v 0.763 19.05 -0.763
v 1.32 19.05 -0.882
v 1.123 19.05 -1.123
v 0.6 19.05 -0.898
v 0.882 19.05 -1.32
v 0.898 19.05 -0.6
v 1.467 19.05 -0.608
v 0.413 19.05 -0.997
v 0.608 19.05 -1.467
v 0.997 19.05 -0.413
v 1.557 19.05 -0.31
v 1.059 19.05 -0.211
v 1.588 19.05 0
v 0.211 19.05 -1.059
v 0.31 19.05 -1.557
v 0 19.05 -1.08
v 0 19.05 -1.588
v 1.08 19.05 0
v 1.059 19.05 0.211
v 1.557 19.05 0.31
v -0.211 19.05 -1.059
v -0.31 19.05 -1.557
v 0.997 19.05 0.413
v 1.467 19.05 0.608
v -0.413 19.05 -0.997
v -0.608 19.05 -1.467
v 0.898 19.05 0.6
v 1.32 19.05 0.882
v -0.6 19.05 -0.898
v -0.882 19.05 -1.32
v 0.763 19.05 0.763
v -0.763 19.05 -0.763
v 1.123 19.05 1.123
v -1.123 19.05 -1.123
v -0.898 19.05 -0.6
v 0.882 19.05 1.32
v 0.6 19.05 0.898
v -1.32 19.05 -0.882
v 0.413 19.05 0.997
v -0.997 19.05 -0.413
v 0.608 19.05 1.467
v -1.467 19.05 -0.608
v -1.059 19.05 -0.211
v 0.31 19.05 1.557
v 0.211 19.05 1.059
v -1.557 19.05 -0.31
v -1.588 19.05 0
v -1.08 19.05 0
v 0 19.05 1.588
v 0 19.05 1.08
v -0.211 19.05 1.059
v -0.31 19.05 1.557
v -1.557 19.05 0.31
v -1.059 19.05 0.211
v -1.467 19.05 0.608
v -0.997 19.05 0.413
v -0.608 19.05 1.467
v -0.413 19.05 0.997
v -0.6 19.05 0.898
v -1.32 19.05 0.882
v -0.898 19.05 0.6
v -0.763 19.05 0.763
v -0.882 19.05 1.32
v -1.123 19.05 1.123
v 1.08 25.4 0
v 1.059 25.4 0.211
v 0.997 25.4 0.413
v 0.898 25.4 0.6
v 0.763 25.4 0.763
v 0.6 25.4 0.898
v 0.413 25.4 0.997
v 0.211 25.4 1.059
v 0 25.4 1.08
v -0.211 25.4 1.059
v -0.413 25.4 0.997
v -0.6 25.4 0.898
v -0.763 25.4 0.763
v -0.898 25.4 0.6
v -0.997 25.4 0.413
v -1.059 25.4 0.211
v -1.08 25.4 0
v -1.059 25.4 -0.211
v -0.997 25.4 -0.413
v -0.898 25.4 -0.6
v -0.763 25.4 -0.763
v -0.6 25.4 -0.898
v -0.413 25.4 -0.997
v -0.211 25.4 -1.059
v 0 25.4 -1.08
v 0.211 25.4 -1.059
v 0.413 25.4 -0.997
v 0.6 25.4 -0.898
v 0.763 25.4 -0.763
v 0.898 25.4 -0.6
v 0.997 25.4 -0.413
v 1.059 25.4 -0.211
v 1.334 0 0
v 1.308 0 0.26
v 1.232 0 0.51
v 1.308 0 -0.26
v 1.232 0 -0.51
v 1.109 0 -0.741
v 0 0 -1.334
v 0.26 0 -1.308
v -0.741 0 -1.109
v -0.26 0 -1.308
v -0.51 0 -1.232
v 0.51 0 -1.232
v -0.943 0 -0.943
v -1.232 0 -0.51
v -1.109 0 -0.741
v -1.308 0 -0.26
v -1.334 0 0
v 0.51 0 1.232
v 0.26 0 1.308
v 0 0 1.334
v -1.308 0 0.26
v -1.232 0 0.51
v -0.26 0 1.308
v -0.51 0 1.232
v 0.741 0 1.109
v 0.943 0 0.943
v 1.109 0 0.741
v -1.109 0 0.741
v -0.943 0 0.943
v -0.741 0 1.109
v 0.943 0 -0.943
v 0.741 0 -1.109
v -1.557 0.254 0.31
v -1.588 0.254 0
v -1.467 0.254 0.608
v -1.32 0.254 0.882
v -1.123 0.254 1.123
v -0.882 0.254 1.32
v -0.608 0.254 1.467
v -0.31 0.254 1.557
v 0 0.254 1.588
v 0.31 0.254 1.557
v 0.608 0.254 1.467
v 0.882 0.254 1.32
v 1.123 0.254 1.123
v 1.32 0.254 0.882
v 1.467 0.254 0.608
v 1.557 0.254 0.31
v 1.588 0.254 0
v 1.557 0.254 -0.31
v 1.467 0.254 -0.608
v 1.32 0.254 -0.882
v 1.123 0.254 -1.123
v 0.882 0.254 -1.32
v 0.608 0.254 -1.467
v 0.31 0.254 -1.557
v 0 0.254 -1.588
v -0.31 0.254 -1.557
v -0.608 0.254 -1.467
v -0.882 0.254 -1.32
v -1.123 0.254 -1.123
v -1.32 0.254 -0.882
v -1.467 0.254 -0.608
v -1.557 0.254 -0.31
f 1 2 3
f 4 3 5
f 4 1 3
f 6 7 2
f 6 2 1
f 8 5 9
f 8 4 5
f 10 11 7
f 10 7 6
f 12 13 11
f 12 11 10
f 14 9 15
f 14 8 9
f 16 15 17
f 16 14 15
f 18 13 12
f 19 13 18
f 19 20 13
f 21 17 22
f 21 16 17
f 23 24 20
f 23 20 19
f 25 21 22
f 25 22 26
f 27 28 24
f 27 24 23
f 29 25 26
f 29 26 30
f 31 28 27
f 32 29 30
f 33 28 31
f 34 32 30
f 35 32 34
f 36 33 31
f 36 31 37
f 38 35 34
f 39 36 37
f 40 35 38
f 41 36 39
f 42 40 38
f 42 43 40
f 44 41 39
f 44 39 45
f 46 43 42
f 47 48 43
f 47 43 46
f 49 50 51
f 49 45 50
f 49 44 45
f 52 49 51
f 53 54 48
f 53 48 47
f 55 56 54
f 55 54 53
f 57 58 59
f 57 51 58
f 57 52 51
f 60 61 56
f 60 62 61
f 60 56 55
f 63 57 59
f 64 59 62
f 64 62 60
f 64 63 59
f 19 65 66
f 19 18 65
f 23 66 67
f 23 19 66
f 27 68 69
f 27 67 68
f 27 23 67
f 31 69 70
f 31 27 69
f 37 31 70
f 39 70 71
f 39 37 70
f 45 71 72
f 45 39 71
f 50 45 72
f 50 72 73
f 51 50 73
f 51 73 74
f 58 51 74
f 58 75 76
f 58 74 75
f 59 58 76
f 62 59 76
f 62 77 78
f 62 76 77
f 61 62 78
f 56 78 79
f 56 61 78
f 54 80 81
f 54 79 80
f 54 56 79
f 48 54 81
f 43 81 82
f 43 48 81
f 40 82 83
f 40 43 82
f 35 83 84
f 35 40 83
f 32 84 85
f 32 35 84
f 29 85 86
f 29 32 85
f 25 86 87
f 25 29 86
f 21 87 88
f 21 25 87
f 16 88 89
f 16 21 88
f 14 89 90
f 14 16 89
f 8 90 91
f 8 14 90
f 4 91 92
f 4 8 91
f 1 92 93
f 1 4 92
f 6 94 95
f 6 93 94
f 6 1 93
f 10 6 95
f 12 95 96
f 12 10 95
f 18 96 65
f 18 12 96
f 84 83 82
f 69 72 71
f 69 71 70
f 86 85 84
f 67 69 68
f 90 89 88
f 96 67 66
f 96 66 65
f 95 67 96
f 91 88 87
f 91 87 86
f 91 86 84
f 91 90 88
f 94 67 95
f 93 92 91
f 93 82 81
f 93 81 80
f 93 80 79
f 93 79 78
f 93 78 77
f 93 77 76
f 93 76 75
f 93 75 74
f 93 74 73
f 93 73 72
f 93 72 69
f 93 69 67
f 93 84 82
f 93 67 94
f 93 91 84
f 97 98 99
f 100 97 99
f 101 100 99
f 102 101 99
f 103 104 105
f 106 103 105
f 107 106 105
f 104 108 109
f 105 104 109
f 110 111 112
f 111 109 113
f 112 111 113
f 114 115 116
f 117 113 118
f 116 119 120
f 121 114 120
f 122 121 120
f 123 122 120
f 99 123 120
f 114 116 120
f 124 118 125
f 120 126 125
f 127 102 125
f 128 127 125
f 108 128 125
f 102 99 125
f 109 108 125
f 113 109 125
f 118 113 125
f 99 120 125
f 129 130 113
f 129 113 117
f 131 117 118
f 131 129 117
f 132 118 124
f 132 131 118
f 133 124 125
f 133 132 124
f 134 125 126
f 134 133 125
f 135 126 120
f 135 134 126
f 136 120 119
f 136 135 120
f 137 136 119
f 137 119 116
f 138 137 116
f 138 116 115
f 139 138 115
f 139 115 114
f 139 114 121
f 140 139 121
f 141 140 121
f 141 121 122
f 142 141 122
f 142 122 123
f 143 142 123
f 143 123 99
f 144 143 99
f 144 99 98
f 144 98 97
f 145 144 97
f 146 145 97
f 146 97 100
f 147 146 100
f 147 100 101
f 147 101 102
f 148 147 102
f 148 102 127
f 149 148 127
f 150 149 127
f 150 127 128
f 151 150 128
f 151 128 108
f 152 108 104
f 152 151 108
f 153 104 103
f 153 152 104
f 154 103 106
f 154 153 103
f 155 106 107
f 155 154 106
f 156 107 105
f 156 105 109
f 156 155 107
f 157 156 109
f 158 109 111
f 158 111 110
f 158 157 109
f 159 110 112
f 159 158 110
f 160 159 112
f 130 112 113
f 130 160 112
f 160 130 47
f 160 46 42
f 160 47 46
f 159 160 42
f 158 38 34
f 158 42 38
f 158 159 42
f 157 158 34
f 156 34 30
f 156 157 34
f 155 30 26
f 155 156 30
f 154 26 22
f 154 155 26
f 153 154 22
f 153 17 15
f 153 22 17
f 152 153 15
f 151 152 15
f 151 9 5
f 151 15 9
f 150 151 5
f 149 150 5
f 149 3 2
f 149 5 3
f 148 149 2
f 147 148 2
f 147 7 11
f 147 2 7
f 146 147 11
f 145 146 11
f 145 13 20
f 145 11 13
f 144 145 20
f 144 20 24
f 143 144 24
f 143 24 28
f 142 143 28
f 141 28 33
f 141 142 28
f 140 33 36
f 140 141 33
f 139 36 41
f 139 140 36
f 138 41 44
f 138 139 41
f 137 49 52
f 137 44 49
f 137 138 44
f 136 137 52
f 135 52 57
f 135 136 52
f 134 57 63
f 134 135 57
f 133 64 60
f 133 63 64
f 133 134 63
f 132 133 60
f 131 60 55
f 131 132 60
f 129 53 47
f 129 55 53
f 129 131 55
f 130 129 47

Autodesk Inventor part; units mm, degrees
ref_plane "YZ Plane" through (0, 0, 0) normal (1, 0, 0) x (0, 1, 0)
ref_plane "XZ Plane" through (0, 0, 0) normal (0, 1, 0) x (-1, 0, 0)
ref_plane "XY Plane" through (0, 0, 0) normal (0, 0, 1) x (1, 0, 0)
sketch "Sketch1" plane through (0, 0, 0) normal (0, 1, 0) x (-1, 0, 0)
  circle A0 centre (0, 0) radius 1.5875
  dimension "d0" = 3.175
extrude "Extrusion1" add sketch "Sketch1" along normal blind 19.05
thread "Thread1" size "5-40 UNC" class "2A" standard "ANSI Unified Screw Threads" length 17.78
sketch "Sketch2" plane through (0, 19.05, 0) normal (0, 1, 0) x (1, 0, 0)
  circle A0 centre (0, 0) radius 1.0795
  dimension "d5" = 2.159
extrude "Extrusion2" add sketch "Sketch2" along normal blind 6.35
chamfer "Chamfer1" distance 0.254 angle 45 1 edges at (1.5875, 0, 0)
sketch "Sketch3" plane through (0, 0, 0) normal (1, 0, 0) x (0, 1, 0)
  point P0 (0, 0)
properties part number "burner_rod_1or3"
